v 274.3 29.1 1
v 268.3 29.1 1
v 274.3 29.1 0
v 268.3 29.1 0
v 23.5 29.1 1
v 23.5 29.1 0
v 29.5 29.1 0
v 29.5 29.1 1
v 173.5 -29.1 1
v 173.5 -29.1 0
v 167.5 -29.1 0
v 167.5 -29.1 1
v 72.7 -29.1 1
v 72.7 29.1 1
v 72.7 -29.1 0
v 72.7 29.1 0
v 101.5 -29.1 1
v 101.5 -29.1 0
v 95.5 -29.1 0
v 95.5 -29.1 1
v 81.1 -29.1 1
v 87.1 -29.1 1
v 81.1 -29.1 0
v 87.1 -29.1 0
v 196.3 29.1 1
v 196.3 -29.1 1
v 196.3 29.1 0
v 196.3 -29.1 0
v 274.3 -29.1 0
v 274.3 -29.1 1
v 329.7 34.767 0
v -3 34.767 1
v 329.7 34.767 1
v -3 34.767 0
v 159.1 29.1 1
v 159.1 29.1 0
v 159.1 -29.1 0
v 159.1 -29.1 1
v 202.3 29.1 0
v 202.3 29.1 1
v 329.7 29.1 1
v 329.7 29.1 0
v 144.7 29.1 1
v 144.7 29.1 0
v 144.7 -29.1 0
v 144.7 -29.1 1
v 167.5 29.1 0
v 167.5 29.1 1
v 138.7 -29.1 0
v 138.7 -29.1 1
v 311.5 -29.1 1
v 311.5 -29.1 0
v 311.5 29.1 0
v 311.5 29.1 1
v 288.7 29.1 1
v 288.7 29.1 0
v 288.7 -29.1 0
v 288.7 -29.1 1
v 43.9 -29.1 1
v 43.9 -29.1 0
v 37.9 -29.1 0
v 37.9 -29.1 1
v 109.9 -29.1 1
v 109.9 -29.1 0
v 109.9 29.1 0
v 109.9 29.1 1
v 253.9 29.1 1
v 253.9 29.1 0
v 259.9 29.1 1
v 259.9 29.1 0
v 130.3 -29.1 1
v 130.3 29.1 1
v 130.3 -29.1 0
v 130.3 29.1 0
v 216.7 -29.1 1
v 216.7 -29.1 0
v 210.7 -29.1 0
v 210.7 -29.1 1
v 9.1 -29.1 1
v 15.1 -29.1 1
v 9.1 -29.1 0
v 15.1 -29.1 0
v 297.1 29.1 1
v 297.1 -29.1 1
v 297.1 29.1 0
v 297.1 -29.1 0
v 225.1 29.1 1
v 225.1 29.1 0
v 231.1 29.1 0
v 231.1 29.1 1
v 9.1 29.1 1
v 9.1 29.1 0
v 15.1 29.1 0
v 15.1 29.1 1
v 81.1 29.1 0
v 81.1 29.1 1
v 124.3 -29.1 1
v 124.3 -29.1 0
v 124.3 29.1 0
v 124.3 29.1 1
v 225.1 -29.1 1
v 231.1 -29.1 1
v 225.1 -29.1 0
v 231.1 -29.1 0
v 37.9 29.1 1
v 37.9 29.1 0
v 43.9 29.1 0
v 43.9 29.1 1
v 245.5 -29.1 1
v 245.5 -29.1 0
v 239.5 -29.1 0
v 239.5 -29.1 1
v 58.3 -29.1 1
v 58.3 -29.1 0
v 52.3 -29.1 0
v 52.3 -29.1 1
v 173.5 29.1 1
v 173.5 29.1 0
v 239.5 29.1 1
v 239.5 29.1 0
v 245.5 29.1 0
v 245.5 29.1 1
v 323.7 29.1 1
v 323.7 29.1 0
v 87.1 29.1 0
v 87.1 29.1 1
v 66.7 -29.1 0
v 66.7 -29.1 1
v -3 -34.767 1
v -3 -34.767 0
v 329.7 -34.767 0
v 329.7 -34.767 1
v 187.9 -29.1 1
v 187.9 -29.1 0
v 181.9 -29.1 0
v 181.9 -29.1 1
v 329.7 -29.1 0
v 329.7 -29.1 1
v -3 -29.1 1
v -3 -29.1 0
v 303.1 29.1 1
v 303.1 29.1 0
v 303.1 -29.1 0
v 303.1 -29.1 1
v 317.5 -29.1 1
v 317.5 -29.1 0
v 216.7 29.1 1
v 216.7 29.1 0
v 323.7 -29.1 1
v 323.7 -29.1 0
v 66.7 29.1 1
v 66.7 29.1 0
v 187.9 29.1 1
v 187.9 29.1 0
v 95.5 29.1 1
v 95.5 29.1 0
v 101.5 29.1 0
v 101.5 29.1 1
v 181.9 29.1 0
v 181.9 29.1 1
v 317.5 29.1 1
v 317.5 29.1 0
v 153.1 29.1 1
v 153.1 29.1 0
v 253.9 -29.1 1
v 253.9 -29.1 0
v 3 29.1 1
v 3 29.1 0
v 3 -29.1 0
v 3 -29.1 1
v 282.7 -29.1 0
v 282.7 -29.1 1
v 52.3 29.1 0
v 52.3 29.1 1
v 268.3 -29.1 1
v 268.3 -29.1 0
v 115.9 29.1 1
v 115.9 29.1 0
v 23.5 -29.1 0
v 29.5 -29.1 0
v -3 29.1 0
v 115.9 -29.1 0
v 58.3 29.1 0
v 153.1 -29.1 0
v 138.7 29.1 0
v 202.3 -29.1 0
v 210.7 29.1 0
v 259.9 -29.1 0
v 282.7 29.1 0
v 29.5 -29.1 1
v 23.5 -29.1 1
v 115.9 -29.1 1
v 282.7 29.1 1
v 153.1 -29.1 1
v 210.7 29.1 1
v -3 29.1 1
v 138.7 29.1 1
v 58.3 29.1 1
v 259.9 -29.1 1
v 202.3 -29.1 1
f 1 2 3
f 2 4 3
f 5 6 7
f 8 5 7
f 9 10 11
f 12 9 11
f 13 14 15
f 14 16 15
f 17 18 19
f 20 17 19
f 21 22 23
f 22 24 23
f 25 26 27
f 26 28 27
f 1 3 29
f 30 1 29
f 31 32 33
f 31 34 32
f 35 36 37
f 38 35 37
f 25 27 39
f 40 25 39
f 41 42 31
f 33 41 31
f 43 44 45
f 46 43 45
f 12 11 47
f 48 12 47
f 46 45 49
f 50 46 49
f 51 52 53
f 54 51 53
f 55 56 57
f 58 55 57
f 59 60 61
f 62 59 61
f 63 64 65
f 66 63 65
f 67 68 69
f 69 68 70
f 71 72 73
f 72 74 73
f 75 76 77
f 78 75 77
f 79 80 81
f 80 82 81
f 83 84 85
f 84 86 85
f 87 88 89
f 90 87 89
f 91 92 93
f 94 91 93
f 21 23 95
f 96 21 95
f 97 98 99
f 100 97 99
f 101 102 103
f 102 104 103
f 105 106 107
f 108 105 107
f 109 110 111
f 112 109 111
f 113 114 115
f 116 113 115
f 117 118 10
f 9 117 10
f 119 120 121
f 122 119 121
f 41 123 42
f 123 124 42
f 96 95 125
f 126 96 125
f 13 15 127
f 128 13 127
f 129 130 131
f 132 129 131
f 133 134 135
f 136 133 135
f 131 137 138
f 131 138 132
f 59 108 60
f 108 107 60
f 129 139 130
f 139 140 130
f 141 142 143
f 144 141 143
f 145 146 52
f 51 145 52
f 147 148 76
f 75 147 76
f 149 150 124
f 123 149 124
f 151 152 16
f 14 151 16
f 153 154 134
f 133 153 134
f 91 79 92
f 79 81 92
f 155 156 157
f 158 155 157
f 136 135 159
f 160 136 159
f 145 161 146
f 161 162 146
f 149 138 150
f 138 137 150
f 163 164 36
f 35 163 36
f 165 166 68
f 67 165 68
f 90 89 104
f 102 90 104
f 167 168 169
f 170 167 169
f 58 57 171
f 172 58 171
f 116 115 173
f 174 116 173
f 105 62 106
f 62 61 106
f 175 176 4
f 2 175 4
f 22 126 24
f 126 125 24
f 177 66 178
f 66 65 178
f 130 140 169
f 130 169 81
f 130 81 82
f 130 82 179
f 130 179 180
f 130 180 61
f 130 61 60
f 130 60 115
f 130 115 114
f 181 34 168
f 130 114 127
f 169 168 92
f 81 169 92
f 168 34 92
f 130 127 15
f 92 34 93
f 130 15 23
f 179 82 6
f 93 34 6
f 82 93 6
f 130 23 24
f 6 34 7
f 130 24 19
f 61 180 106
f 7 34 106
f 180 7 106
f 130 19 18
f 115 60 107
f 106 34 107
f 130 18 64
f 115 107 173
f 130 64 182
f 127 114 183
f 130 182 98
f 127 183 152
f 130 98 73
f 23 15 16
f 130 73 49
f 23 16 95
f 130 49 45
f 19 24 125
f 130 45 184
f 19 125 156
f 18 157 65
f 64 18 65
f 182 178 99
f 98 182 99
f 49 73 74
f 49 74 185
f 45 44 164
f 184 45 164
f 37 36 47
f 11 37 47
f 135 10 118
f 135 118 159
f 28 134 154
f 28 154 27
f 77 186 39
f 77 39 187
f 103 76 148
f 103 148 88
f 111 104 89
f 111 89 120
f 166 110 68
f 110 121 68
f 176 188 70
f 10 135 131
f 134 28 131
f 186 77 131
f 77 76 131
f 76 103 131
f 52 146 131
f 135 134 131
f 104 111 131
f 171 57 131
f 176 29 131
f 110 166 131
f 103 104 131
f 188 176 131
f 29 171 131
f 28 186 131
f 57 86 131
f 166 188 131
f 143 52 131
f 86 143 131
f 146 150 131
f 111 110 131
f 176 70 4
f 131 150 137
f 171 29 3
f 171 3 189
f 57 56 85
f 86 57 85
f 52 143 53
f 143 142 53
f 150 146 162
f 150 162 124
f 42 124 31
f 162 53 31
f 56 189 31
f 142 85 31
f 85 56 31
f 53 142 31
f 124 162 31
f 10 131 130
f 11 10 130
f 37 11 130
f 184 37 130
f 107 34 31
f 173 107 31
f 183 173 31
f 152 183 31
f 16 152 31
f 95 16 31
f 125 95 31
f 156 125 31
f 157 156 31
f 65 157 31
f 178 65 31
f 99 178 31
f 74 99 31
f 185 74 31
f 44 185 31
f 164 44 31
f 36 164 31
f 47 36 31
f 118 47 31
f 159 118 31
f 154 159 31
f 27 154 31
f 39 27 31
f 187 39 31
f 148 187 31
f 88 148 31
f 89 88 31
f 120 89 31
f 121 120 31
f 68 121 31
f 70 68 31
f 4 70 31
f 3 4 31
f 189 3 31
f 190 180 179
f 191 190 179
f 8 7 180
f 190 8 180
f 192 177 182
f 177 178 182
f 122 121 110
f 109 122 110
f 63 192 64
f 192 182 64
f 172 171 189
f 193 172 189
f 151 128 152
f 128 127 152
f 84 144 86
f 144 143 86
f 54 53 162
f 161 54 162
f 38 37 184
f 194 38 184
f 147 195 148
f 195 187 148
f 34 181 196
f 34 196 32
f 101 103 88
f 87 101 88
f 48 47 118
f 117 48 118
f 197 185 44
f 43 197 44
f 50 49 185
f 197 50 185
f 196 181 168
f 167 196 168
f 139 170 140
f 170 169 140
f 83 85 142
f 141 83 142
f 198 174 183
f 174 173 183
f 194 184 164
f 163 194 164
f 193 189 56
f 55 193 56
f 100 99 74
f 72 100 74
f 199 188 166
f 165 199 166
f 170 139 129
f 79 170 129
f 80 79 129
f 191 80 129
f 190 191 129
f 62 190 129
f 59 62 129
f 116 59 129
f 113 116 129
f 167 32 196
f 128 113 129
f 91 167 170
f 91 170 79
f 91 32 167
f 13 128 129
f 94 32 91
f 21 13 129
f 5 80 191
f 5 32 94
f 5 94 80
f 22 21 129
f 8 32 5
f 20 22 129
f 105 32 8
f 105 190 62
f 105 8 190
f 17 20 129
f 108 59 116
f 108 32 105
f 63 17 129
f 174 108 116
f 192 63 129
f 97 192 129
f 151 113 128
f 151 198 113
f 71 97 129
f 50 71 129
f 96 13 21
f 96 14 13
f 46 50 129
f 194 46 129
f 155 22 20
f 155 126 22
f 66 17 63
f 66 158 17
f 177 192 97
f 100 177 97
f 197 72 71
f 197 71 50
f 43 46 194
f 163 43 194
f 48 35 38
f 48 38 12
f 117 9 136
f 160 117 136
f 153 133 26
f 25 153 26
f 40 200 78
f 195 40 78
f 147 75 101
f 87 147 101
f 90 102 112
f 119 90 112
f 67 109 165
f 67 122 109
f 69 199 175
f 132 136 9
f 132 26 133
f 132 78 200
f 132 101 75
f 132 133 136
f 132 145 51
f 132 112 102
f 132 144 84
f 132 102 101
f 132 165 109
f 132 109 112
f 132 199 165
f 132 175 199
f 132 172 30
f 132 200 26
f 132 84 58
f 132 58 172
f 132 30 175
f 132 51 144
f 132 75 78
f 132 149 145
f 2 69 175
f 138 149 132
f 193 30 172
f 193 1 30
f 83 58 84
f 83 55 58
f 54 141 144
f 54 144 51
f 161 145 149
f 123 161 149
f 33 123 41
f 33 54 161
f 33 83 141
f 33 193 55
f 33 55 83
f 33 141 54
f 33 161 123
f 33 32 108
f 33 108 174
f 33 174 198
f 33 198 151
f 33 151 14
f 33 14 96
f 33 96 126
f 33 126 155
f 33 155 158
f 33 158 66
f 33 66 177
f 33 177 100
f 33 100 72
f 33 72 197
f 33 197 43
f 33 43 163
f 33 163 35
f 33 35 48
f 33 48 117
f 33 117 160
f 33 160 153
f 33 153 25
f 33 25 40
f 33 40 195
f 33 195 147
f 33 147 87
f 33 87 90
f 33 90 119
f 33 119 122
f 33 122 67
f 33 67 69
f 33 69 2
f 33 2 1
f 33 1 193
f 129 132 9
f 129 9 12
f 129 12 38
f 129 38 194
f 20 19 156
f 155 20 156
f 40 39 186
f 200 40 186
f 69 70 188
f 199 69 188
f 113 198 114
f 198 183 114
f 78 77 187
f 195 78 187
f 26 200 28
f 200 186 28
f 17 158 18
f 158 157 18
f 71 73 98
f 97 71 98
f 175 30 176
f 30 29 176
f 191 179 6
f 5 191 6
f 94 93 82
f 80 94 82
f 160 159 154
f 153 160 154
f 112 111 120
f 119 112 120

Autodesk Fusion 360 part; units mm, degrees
sketch "Skizze1" plane through (0, 0, 0) normal (0, 0, 1) x (1, 0, 0)
  line L0 (-3, 29.1) -> (3, 29.1)
  line L1 (3, 29.1) -> (3, 0)
  line L2 (3, 0) -> (-3, 0)
  line L3 (-3, 0) -> (-3, 29.1)
  line L4 (0, 29.1) -> (0, 0) construction
  line L5 (0, 0) -> (500, 0) construction
  line L6 (9.1, 29.1) -> (15.1, 29.1)
  line L7 (15.1, 29.1) -> (15.1, 0)
  line L8 (15.1, 0) -> (9.1, 0)
  line L9 (9.1, 0) -> (9.1, 29.1)
  line L10 (12.1, 29.1) -> (12.1, 0) construction
  line L11 (26.5, 29.1) -> (26.5, 0) construction
  line L12 (23.5, 29.1) -> (29.5, 29.1)
  line L13 (29.5, 0) -> (23.5, 0)
  line L14 (23.5, 0) -> (23.5, 29.1)
  line L15 (29.5, 29.1) -> (29.5, 0)
  line L16 (58.3, 0) -> (52.3, 0)
  line L17 (55.3, 29.1) -> (55.3, 0) construction
  line L18 (43.9, 29.1) -> (43.9, 0)
  line L19 (37.9, 29.1) -> (43.9, 29.1)
  line L20 (52.3, 29.1) -> (58.3, 29.1)
  line L21 (58.3, 29.1) -> (58.3, 0)
  line L22 (40.9, 29.1) -> (40.9, 0) construction
  line L23 (43.9, 0) -> (37.9, 0)
  line L24 (52.3, 0) -> (52.3, 29.1)
  line L25 (37.9, 0) -> (37.9, 29.1)
  line L26 (84.1, 29.1) -> (84.1, 0) construction
  line L27 (66.7, 0) -> (66.7, 29.1)
  line L28 (69.7, 29.1) -> (69.7, 0) construction
  line L29 (95.5, 0) -> (95.5, 29.1)
  line L30 (98.5, 29.1) -> (98.5, 0) construction
  line L31 (66.7, 29.1) -> (72.7, 29.1)
  line L32 (81.1, 0) -> (81.1, 29.1)
  line L33 (72.7, 29.1) -> (72.7, 0)
  line L34 (101.5, 29.1) -> (101.5, 0)
  line L35 (95.5, 29.1) -> (101.5, 29.1)
  line L36 (109.9, 29.1) -> (115.9, 29.1)
  line L37 (72.7, 0) -> (66.7, 0)
  line L38 (87.1, 0) -> (81.1, 0)
  line L39 (109.9, 0) -> (109.9, 29.1)
  line L40 (115.9, 0) -> (109.9, 0)
  line L41 (115.9, 29.1) -> (115.9, 0)
  line L42 (112.9, 29.1) -> (112.9, 0) construction
  line L43 (81.1, 29.1) -> (87.1, 29.1)
  line L44 (87.1, 29.1) -> (87.1, 0)
  line L45 (101.5, 0) -> (95.5, 0)
  line L46 (156.1, 29.1) -> (156.1, 0) construction
  line L47 (144.7, 29.1) -> (144.7, 0)
  line L48 (153.1, 29.1) -> (159.1, 29.1)
  line L49 (138.7, 29.1) -> (144.7, 29.1)
  line L50 (153.1, 0) -> (153.1, 29.1)
  line L51 (167.5, 29.1) -> (173.5, 29.1)
  line L52 (196.3, 0) -> (196.3, 29.1)
  line L53 (202.3, 0) -> (196.3, 0)
  line L54 (216.7, 0) -> (210.7, 0)
  line L55 (130.3, 29.1) -> (130.3, 0)
  line L56 (130.3, 0) -> (124.3, 0)
  line L57 (181.9, 29.1) -> (187.9, 29.1)
  line L58 (173.5, 29.1) -> (173.5, 0)
  line L59 (124.3, 0) -> (124.3, 29.1)
  line L60 (144.7, 0) -> (138.7, 0)
  line L61 (210.7, 0) -> (210.7, 29.1)
  line L62 (225.1, 29.1) -> (231.1, 29.1)
  line L63 (127.3, 29.1) -> (127.3, 0) construction
  line L64 (159.1, 29.1) -> (159.1, 0)
  line L65 (210.7, 29.1) -> (216.7, 29.1)
  line L66 (187.9, 0) -> (181.9, 0)
  line L67 (216.7, 29.1) -> (216.7, 0)
  line L68 (138.7, 0) -> (138.7, 29.1)
  line L69 (187.9, 29.1) -> (187.9, 0)
  line L70 (199.3, 29.1) -> (199.3, 0) construction
  line L71 (213.7, 29.1) -> (213.7, 0) construction
  line L72 (228.1, 29.1) -> (228.1, 0) construction
  line L73 (159.1, 0) -> (153.1, 0)
  line L74 (170.5, 29.1) -> (170.5, 0) construction
  line L75 (196.3, 29.1) -> (202.3, 29.1)
  line L76 (141.7, 29.1) -> (141.7, 0) construction
  line L77 (225.1, 0) -> (225.1, 29.1)
  line L78 (184.9, 29.1) -> (184.9, 0) construction
  line L79 (181.9, 0) -> (181.9, 29.1)
  line L80 (173.5, 0) -> (167.5, 0)
  line L81 (231.1, 29.1) -> (231.1, 0)
  line L82 (167.5, 0) -> (167.5, 29.1)
  line L83 (202.3, 29.1) -> (202.3, 0)
  line L84 (124.3, 29.1) -> (130.3, 29.1)
  line L85 (231.1, 0) -> (225.1, 0)
  line L86 (288.7, 29.1) -> (288.7, 0)
  line L87 (317.5, 0) -> (311.5, 0)
  line L88 (329.7, 29.1) -> (329.7, 0)
  line L89 (285.7, 29.1) -> (285.7, 0) construction
  line L90 (329.7, 0) -> (323.7, 0)
  line L91 (311.5, 29.1) -> (317.5, 29.1)
  line L92 (303.1, 29.1) -> (303.1, 0)
  line L93 (245.5, 0) -> (239.5, 0)
  line L94 (323.7, 29.1) -> (329.7, 29.1)
  line L95 (271.3, 29.1) -> (271.3, 0) construction
  line L96 (282.7, 29.1) -> (288.7, 29.1)
  line L97 (282.7, 0) -> (282.7, 29.1)
  line L98 (300.1, 29.1) -> (300.1, 0) construction
  line L99 (274.3, 29.1) -> (274.3, 0)
  line L100 (326.7, 29.1) -> (326.7, 0) construction
  line L101 (268.3, 0) -> (268.3, 29.1)
  line L102 (259.9, 0) -> (253.9, 0)
  line L103 (253.9, 29.1) -> (259.9, 29.1)
  line L104 (303.1, 0) -> (297.1, 0)
  line L105 (288.7, 0) -> (282.7, 0)
  line L106 (297.1, 29.1) -> (303.1, 29.1)
  line L107 (314.5, 29.1) -> (314.5, 0) construction
  line L108 (317.5, 29.1) -> (317.5, 0)
  line L109 (245.5, 29.1) -> (245.5, 0)
  line L110 (323.7, 0) -> (323.7, 29.1)
  line L111 (239.5, 29.1) -> (245.5, 29.1)
  line L112 (253.9, 0) -> (253.9, 29.1)
  line L113 (239.5, 0) -> (239.5, 29.1)
  line L114 (242.5, 29.1) -> (242.5, 0) construction
  line L115 (311.5, 0) -> (311.5, 29.1)
  line L116 (259.9, 29.1) -> (259.9, 0)
  line L117 (268.3, 29.1) -> (274.3, 29.1)
  line L118 (274.3, 0) -> (268.3, 0)
  line L119 (297.1, 0) -> (297.1, 29.1)
  line L120 (256.9, 29.1) -> (256.9, 0) construction
  dimension "d3" = 500
  dimension "d4" = 29.1
  dimension "d5" = 6
  dimension "d8" = 29.1
  dimension "d9" = 6
  dimension "d10" = 29.1
  dimension "d11" = 6
  dimension "d12" = 29.1
  dimension "d13" = 6
  dimension "d14" = 29.1
  dimension "d15" = 6
  dimension "d16" = 29.1
  dimension "d17" = 6
  dimension "d18" = 29.1
  dimension "d19" = 6
  dimension "d20" = 29.1
  dimension "d21" = 6
  dimension "d22" = 29.1
  dimension "d23" = 6
  dimension "d24" = 29.1
  dimension "d25" = 6
  dimension "d26" = 29.1
  dimension "d27" = 6
  dimension "d28" = 29.1
  dimension "d29" = 6
  dimension "d30" = 29.1
  dimension "d31" = 6
  dimension "d32" = 29.1
  dimension "d33" = 6
  dimension "d34" = 29.1
  dimension "d35" = 6
  dimension "d36" = 29.1
  dimension "d37" = 6
  dimension "d38" = 29.1
  dimension "d39" = 6
  dimension "d40" = 29.1
  dimension "d41" = 6
  dimension "d42" = 29.1
  dimension "d43" = 6
  dimension "d44" = 29.1
  dimension "d45" = 6
  dimension "d46" = 29.1
  dimension "d47" = 6
  dimension "d48" = 29.1
  dimension "d49" = 6
  dimension "d50" = 29.1
  dimension "d51" = 6
  dimension "d52" = 29.1
  dimension "d53" = 6
  dimension "d54" = 12.1
  dimension "d55" = 14.4
  dimension "d56" = 14.4
  dimension "d57" = 14.4
  dimension "d58" = 14.4
  dimension "d59" = 14.4
  dimension "d60" = 14.4
  dimension "d61" = 14.4
  dimension "d62" = 14.4
  dimension "d63" = 14.4
  dimension "d64" = 14.4
  dimension "d65" = 14.4
  dimension "d66" = 14.4
  dimension "d67" = 14.4
  dimension "d68" = 14.4
  dimension "d69" = 14.4
  dimension "d70" = 14.4
  dimension "d71" = 14.4
  dimension "d72" = 14.4
  dimension "d73" = 14.4
  dimension "d74" = 14.4
  dimension "d75" = 14.4
  dimension "d76" = 12.2
extrude "Extrusion1" add sketch "Skizze1" along normal blind 3 makes body 1 at (301.1, 19.4, 0) makes body 2 at (243.5, 9.7, 0) makes body 3 at (183.9, 19.4, 0) makes body 4 at (126.3, 9.7, 0) makes body 5 at (68.7, 19.4, 0) makes body 6 at (13.1, 9.7, 0) makes body 7 at (27.5, 9.7, 0) makes body 8 at (83.1, 9.7, 0) makes body 9 at (140.7, 19.4, 0) makes body 10 at (200.3, 9.7, 0) makes body 11 at (255.9, 9.7, 0) makes body 12 at (313.5, 9.7, 0) makes body 13 at (284.7, 9.7, 0) makes body 14 at (229.1, 9.7, 0) makes body 15 at (171.5, 9.7, 0) makes body 16 at (113.9, 19.4, 0) makes body 17 at (56.3, 9.7, 0) makes body 18 at (1, 9.7, 0) makes body 19 at (41.9, 9.7, 0) makes body 20 at (97.5, 9.7, 0) makes body 21 at (155.1, 19.4, 0) makes body 22 at (212.7, 19.4, 0) makes body 23 at (270.3, 9.7, 0) makes body 24 at (327.7, 19.4, 0)
move_face "Flächen versetzen1" offset 29.1 24 faces at (229.1, 0, 1) (56.3, 0, 1) (1, 0, 1) (41.9, 0, 1) (99.5, 0, 1) (157.1, 0, 1) (214.7, 0, 1) (272.3, 0, 1) (327.7, 0, 1) (286.7, 0, 1) (301.1, 0, 1) (243.5, 0, 1) (185.9, 0, 1) (128.3, 0, 1) (70.7, 0, 1) (13.1, 0, 1) (27.5, 0, 1) (85.1, 0, 1) (142.7, 0, 1) (200.3, 0, 1) (257.9, 0, 1) (315.5, 0, 1) (171.5, 0, 1) (113.9, 0, 1) on bodies 1 2 3 4 5 6 7 8 9 10 11 12 13 14 15 16 17 18 19 20 21 22 23 24
sketch "Skizze2" plane through (0, 0, 0) normal (0, 0, 1) x (1, 0, 0)
  line L0 (-3, 29.1) -> (-3, -29.1)
  line L1 (329.7, -29.1) -> (329.7, 29.1)
  line L2 (-3, 29.1) -> (-3, 34.7667)
  line L3 (-3, -29.1) -> (-3, -34.7667)
  line L4 (329.7, 29.1) -> (329.7, 34.7667)
  line L5 (329.7, -29.1) -> (329.7, -34.7667)
  line L6 (-3, 34.7667) -> (329.7, 34.7667)
  line L7 (-3, -34.7667) -> (329.7, -34.7667)
  dimension "d80" = 5.6667
  dimension "d81" = 5.6667
  dimension "d82" = 5.6667
  dimension "d83" = 5.6667
extrude "Extrusion2" add sketch "Skizze2" along normal blind 1 separate body makes body 25
combine "Kombinieren1" operation cut target body 25 tool bodies 18 6 7 19 17 5 8 20 16 4 9 21 15 3 10 22 14 2 11 23 13 1 12 24 keep tools
hidden bodies 1 2 3 4 5 6 7 8 9 10 11 12 13 14 15 16 17 18 19 20 21 22 23 24
equation "Schwellen_Länge = 58 mm + 0.2 mm"
equation "Schwellen_Breite = 5.8 mm + 0.2 mm"
equation "d4 = Schwellen_Länge / 2"
equation "d5 = Schwellen_Breite"
equation "d8 = Schwellen_Länge / 2"
equation "d9 = Schwellen_Breite"
equation "d10 = Schwellen_Länge / 2"
equation "d11 = Schwellen_Breite"
equation "d12 = Schwellen_Länge / 2"
equation "d13 = Schwellen_Breite"
equation "d14 = Schwellen_Länge / 2"
equation "d15 = Schwellen_Breite"
equation "d16 = Schwellen_Länge / 2"
equation "d17 = Schwellen_Breite"
equation "d18 = Schwellen_Länge / 2"
equation "d19 = Schwellen_Breite"
equation "d20 = Schwellen_Länge / 2"
equation "d21 = Schwellen_Breite"
equation "d22 = Schwellen_Länge / 2"
equation "d23 = Schwellen_Breite"
equation "d24 = Schwellen_Länge / 2"
equation "d25 = Schwellen_Breite"
equation "d26 = Schwellen_Länge / 2"
equation "d27 = Schwellen_Breite"
equation "d28 = Schwellen_Länge / 2"
equation "d29 = Schwellen_Breite"
equation "d30 = Schwellen_Länge / 2"
equation "d31 = Schwellen_Breite"
equation "d32 = Schwellen_Länge / 2"
equation "d33 = Schwellen_Breite"
equation "d34 = Schwellen_Länge / 2"
equation "d35 = Schwellen_Breite"
equation "d36 = Schwellen_Länge / 2"
equation "d37 = Schwellen_Breite"
equation "d38 = Schwellen_Länge / 2"
equation "d39 = Schwellen_Breite"
equation "d40 = Schwellen_Länge / 2"
equation "d41 = Schwellen_Breite"
equation "d42 = Schwellen_Länge / 2"
equation "d43 = Schwellen_Breite"
equation "d44 = Schwellen_Länge / 2"
equation "d45 = Schwellen_Breite"
equation "d46 = Schwellen_Länge / 2"
equation "d47 = Schwellen_Breite"
equation "d48 = Schwellen_Länge / 2"
equation "d49 = Schwellen_Breite"
equation "d50 = Schwellen_Länge / 2"
equation "d51 = Schwellen_Breite"
equation "d52 = Schwellen_Länge / 2"
equation "d53 = Schwellen_Breite"
equation "d54 = Schwellen_Abstand_Anfang"
equation "d55 = Schwellen_Abstand_Mitte"
equation "d56 = Schwellen_Abstand_Mitte"
equation "d57 = Schwellen_Abstand_Mitte"
equation "d58 = Schwellen_Abstand_Mitte"
equation "d59 = Schwellen_Abstand_Mitte"
equation "d60 = Schwellen_Abstand_Mitte"
equation "d61 = Schwellen_Abstand_Mitte"
equation "d62 = Schwellen_Abstand_Mitte"
equation "d63 = Schwellen_Abstand_Mitte"
equation "d64 = Schwellen_Abstand_Mitte"
equation "d65 = Schwellen_Abstand_Mitte"
equation "d66 = Schwellen_Abstand_Mitte"
equation "d67 = Schwellen_Abstand_Mitte"
equation "d68 = Schwellen_Abstand_Mitte"
equation "d69 = Schwellen_Abstand_Mitte"
equation "d70 = Schwellen_Abstand_Mitte"
equation "d71 = Schwellen_Abstand_Mitte"
equation "d72 = Schwellen_Abstand_Mitte"
equation "d73 = Schwellen_Abstand_Mitte"
equation "d74 = Schwellen_Abstand_Mitte"
equation "d75 = Schwellen_Abstand_Mitte"
equation "d76 = Schwellen_Abstand_Ende"
equation "d79 = Schwellen_Länge / 2"
equation "d80 = ( Trassenbrett_Breite / Schwellen_Breite / 2 ) * 1 mm"
equation "d81 = d80"
equation "d82 = d80"
equation "d83 = d80"
equation "Schwellen_Abstand_Anfang = 12.1 mm"
equation "Schwellen_Abstand_Mitte = 14.4 mm"
equation "Schwellen_Abstand_Ende = 12.2 mm"
equation "Trassenbrett_Breite = 68 mm"
